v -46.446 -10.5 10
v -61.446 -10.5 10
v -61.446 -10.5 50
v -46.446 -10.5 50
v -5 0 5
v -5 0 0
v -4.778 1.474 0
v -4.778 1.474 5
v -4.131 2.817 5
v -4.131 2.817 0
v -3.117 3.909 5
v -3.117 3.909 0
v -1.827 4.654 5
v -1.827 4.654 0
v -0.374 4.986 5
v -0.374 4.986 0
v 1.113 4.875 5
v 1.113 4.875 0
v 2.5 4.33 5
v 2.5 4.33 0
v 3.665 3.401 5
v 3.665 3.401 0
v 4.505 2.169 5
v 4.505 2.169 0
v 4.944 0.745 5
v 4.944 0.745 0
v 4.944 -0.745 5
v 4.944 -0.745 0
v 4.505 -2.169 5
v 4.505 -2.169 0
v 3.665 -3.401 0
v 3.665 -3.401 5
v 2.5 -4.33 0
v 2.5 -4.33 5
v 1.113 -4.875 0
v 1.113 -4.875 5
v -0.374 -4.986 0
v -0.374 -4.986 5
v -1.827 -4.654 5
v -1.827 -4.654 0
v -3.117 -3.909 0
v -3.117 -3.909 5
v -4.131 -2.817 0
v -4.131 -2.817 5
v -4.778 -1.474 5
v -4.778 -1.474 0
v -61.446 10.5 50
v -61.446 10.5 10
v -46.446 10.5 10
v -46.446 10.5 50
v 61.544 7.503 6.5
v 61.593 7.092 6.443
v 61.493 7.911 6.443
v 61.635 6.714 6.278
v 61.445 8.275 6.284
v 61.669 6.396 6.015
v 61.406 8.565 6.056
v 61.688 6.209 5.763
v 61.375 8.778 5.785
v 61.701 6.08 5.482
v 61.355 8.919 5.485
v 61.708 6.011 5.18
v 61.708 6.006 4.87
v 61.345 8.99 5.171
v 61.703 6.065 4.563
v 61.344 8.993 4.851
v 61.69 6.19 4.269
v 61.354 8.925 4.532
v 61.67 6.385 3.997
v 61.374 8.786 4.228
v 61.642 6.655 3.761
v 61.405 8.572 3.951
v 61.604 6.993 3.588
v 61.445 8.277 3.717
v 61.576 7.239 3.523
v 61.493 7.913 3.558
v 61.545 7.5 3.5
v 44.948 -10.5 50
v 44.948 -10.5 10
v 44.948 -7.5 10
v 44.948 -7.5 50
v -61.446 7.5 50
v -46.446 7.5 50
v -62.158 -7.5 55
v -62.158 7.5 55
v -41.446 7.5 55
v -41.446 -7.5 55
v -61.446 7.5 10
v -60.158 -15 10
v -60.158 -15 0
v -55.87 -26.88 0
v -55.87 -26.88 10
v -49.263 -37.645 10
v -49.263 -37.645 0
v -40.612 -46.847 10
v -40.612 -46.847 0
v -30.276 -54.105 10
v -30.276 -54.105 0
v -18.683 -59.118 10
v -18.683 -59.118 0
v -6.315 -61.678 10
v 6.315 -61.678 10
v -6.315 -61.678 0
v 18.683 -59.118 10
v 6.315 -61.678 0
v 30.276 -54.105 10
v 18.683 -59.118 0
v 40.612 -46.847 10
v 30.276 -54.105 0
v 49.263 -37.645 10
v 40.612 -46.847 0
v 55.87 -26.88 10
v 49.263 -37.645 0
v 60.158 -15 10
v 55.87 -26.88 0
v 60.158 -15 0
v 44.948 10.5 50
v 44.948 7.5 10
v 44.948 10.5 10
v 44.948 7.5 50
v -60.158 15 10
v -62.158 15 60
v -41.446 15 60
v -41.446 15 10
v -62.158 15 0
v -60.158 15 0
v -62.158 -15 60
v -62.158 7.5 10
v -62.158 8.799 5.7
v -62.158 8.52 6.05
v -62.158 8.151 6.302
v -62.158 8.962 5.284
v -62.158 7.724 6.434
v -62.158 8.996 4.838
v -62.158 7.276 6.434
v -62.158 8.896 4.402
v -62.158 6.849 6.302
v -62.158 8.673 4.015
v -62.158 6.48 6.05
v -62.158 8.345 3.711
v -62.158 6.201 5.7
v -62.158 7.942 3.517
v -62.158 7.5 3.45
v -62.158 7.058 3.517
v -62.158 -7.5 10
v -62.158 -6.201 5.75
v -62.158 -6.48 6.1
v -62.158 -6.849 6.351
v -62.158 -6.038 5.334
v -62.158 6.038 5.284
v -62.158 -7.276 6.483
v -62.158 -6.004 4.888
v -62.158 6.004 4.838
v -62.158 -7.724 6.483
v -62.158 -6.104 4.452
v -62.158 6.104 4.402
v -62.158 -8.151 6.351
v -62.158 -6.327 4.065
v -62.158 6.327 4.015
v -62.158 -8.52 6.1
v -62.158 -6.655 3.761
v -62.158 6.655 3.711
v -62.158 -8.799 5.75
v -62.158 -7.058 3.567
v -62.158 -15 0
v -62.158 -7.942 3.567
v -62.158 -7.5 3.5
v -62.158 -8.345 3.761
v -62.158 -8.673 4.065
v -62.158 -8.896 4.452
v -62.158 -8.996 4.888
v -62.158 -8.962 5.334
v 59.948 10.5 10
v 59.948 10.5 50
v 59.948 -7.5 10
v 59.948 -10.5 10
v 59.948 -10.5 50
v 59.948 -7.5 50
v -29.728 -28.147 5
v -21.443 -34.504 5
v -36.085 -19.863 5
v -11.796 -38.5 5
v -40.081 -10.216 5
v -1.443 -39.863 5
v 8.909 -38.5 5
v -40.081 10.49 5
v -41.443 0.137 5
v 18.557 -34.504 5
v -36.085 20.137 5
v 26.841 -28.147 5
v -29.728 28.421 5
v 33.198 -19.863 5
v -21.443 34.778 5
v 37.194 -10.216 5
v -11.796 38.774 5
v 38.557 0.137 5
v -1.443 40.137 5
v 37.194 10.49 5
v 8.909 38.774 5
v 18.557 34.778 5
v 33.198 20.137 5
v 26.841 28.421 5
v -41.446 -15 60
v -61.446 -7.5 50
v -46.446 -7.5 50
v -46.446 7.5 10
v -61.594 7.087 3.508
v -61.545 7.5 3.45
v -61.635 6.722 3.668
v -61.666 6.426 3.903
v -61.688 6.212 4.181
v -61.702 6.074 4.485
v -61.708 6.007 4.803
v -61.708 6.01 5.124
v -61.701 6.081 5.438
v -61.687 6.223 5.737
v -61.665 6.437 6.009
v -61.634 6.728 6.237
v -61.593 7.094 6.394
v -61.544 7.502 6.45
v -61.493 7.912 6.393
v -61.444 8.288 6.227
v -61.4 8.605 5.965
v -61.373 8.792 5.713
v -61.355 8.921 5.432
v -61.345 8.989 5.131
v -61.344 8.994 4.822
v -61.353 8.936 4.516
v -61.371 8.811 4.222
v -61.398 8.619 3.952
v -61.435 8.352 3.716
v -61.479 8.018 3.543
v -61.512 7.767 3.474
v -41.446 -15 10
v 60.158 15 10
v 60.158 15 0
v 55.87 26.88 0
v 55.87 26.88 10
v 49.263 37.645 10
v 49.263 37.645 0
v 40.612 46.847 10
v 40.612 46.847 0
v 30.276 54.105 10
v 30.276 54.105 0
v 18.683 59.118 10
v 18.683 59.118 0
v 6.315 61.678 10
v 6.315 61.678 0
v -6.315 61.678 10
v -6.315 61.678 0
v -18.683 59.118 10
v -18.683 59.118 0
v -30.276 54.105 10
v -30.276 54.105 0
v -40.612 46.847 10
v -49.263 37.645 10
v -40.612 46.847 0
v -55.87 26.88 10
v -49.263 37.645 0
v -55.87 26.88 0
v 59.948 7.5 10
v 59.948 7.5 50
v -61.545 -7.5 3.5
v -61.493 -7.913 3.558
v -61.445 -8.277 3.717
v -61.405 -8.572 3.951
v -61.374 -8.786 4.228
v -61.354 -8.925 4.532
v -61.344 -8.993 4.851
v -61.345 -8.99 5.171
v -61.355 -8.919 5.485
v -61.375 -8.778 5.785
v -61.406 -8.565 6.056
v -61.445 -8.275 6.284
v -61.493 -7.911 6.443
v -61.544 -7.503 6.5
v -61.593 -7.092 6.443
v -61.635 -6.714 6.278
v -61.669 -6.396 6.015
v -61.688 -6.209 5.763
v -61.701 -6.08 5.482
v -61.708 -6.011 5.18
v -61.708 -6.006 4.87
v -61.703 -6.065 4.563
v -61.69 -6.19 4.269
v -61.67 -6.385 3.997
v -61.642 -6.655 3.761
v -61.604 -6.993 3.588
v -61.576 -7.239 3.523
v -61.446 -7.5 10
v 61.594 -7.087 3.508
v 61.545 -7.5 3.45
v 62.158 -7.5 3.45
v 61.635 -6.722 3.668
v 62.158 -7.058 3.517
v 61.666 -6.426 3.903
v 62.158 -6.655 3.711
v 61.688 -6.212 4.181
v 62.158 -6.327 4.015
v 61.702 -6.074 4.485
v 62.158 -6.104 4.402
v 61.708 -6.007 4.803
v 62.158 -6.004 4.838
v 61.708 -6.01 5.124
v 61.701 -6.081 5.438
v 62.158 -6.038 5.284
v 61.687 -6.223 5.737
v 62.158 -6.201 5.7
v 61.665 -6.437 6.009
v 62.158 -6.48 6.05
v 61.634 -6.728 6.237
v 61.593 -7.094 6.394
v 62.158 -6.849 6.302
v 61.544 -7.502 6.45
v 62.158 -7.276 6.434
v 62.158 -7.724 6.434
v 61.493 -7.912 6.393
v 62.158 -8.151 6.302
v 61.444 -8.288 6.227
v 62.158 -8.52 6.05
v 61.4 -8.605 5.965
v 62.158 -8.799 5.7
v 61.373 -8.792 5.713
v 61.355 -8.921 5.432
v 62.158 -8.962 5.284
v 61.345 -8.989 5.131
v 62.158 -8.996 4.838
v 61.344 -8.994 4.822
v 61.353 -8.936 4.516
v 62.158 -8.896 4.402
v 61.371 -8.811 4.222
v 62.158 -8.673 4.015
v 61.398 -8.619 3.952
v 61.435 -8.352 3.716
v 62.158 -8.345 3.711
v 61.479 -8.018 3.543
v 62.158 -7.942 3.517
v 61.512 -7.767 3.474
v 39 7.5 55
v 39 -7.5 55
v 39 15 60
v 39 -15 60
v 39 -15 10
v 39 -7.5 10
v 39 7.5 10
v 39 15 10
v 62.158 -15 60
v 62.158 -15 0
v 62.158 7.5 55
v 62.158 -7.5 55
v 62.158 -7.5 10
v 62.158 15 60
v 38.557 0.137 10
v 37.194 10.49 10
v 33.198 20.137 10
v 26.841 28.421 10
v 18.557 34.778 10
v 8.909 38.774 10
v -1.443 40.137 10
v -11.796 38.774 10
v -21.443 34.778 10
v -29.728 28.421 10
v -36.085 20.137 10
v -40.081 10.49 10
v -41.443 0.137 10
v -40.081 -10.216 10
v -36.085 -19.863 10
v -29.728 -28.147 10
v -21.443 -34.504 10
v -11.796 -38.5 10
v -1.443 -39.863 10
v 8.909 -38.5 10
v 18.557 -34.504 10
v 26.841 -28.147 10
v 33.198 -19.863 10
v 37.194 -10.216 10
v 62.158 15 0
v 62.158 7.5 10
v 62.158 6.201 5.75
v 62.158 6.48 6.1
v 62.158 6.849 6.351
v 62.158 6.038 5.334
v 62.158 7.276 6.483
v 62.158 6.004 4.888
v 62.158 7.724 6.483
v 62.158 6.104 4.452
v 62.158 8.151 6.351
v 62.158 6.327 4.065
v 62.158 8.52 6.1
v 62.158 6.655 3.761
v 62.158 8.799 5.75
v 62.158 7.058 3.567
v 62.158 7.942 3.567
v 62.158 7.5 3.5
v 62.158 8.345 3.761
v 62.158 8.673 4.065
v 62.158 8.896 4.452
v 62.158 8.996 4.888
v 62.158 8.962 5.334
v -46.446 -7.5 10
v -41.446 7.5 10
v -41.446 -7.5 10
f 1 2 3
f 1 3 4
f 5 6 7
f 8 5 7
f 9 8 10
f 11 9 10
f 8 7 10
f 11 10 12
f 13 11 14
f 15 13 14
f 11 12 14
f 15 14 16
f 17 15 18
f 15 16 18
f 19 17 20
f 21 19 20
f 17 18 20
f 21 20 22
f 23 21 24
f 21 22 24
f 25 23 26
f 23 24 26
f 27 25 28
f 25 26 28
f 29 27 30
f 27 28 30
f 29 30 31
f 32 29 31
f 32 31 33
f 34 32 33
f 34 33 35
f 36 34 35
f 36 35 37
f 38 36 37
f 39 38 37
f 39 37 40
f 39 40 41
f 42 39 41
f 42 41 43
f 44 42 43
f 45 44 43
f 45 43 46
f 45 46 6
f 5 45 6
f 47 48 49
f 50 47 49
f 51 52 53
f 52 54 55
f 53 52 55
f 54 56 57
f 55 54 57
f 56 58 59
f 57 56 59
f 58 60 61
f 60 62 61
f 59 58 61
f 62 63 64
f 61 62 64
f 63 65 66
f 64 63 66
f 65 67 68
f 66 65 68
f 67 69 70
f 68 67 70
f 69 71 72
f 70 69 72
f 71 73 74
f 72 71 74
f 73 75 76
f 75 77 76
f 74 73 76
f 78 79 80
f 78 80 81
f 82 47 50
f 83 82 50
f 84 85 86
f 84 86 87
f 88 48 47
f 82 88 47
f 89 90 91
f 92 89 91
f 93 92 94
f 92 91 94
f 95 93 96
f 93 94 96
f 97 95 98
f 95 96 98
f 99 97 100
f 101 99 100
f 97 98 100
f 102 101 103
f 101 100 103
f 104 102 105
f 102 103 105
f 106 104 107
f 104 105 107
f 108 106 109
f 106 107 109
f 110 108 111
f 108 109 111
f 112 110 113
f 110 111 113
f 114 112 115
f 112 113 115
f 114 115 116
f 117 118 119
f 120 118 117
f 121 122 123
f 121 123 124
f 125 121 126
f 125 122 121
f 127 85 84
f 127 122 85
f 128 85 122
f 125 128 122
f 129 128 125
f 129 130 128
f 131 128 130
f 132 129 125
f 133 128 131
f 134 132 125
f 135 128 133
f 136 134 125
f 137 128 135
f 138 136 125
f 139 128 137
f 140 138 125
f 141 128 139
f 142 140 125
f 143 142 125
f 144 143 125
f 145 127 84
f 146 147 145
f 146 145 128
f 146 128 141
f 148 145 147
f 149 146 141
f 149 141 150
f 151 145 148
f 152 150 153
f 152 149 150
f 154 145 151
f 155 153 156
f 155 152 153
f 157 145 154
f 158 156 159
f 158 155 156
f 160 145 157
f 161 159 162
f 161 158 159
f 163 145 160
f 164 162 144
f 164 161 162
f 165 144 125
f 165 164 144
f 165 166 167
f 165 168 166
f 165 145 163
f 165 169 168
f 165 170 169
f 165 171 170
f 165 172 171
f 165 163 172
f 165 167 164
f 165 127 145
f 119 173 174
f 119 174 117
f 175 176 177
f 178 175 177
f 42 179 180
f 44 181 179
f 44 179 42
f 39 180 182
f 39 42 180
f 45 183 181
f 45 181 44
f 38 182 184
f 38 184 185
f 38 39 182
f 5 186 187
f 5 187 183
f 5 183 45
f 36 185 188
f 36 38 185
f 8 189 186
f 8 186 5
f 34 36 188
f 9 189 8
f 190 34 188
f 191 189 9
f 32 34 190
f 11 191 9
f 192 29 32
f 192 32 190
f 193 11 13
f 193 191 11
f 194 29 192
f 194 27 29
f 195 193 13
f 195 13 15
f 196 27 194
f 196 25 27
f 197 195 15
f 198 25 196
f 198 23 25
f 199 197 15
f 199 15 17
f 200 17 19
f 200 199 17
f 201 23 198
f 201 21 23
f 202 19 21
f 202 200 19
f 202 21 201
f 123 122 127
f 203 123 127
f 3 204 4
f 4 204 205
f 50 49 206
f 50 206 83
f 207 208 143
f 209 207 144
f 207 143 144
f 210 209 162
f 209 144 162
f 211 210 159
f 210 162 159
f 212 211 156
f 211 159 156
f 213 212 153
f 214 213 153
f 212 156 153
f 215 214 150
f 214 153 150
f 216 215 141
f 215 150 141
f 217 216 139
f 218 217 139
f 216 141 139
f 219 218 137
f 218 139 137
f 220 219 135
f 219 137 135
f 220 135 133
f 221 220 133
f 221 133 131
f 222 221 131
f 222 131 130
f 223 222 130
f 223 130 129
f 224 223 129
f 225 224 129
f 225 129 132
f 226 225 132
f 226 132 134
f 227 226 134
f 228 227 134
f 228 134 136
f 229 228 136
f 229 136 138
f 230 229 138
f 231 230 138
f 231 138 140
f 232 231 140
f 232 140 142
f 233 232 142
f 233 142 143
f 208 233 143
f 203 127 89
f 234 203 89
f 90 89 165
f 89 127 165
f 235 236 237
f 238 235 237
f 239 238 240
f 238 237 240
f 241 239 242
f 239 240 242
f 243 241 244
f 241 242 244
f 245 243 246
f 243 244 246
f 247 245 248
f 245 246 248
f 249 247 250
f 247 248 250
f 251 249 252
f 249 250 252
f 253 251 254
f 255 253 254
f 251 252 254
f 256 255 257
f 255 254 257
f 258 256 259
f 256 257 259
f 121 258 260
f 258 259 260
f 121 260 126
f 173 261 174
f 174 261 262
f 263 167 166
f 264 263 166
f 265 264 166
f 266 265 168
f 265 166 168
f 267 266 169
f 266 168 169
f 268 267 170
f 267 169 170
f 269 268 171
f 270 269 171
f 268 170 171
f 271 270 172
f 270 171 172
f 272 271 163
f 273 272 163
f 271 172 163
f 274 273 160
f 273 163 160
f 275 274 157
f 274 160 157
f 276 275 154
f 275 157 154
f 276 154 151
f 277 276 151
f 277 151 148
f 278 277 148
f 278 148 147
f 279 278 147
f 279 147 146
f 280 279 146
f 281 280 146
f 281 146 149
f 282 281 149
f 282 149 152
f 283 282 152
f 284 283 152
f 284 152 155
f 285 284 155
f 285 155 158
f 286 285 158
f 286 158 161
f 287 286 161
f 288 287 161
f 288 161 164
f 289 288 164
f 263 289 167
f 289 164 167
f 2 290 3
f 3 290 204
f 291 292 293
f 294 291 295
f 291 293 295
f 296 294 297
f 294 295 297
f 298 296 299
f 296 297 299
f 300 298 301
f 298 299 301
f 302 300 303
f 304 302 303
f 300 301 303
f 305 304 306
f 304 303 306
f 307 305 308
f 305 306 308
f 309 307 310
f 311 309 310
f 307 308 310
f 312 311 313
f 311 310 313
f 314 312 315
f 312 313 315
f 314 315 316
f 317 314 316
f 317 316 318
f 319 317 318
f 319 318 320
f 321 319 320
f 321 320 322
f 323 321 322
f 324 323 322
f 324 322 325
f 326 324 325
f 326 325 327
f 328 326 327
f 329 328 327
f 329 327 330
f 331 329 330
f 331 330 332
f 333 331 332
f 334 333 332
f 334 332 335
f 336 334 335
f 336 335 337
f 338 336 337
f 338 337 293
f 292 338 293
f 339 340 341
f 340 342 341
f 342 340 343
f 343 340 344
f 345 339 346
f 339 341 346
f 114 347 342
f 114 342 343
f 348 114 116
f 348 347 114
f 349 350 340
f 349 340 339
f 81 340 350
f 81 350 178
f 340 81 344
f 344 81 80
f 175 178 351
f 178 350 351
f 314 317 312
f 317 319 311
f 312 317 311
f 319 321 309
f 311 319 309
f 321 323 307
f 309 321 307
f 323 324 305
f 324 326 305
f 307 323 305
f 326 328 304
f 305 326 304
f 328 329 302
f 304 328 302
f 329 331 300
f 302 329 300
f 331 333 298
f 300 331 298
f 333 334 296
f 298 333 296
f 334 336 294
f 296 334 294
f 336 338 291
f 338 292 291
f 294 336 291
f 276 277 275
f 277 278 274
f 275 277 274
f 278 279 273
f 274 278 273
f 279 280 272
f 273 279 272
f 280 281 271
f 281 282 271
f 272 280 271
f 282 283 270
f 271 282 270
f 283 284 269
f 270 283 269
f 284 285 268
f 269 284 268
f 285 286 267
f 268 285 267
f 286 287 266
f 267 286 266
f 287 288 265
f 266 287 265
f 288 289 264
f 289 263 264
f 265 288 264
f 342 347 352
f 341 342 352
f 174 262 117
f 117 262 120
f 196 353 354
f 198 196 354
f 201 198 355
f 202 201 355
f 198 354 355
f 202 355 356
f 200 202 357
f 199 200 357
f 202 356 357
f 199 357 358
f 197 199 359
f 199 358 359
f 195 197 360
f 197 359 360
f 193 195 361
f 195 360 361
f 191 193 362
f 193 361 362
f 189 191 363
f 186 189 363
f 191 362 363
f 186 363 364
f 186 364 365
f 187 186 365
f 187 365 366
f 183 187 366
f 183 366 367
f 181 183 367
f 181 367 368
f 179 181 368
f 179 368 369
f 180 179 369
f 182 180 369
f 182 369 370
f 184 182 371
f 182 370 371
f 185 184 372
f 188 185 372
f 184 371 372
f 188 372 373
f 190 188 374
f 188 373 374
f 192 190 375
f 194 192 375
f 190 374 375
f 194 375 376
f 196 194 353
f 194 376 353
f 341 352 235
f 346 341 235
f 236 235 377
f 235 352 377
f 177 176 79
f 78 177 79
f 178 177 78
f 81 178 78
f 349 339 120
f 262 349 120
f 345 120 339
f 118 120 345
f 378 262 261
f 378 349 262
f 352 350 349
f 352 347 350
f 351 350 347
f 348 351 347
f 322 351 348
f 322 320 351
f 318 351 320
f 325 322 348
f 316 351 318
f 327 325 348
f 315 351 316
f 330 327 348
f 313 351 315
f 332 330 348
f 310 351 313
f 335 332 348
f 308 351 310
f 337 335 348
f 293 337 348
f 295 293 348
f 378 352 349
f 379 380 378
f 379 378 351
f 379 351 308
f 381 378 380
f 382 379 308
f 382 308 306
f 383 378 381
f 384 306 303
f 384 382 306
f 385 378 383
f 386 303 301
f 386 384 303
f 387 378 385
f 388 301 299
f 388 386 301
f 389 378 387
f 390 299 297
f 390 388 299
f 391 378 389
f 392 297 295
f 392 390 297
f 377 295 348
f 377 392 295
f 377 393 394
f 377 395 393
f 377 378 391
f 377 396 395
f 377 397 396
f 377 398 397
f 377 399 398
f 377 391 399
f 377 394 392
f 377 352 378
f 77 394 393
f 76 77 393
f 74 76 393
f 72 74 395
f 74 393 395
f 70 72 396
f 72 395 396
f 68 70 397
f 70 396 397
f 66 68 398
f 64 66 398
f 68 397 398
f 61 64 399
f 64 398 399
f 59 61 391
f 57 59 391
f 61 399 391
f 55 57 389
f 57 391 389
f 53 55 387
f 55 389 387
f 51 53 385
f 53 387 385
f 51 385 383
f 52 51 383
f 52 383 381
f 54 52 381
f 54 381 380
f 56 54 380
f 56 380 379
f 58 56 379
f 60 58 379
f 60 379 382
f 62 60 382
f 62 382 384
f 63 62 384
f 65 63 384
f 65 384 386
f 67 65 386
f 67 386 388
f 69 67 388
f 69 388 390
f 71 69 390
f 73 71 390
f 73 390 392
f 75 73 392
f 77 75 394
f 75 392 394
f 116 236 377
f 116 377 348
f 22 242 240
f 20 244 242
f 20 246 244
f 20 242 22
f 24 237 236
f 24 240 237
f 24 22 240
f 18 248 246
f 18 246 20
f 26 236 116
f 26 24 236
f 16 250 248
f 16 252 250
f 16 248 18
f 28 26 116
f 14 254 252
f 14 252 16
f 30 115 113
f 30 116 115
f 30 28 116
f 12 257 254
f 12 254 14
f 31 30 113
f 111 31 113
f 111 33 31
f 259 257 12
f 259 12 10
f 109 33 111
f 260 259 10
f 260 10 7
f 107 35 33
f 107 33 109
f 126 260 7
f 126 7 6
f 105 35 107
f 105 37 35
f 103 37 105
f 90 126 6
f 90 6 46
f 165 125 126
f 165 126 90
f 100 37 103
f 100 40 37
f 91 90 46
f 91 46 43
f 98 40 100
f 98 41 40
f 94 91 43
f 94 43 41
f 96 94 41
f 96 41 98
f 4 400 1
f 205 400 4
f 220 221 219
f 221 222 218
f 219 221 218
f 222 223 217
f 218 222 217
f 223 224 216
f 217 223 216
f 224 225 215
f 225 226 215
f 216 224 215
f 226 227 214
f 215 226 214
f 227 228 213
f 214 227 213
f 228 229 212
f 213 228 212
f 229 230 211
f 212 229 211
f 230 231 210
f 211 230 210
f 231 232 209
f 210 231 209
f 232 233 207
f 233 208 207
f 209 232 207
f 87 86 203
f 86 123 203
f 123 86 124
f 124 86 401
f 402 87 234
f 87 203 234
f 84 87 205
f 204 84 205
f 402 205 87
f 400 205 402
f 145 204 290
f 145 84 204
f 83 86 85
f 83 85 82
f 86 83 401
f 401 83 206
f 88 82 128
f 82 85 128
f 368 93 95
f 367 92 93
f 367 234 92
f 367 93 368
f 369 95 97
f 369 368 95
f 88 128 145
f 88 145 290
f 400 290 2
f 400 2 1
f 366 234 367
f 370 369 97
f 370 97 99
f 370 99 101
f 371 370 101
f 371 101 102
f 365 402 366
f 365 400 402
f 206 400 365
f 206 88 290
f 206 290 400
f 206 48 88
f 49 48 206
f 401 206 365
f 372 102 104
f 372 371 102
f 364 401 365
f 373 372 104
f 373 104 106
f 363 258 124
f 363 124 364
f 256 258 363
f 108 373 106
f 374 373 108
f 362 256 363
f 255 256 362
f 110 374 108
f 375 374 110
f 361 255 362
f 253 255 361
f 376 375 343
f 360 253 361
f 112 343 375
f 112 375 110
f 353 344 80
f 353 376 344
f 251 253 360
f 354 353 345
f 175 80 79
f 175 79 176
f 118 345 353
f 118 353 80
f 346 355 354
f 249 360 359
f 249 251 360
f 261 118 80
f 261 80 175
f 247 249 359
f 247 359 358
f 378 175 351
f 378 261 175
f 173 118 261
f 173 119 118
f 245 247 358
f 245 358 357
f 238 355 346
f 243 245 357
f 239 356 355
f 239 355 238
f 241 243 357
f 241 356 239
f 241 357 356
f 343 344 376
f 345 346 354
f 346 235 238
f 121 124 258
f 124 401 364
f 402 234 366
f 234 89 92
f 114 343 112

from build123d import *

# Parameters (mm, degrees)
IZIM1_R                     = 62
Y_KSEKLIK_EKSTR_ZYON1_DEPTH = 10
IZIM2_W                     = 60
IZIM2_H                     = 30
IZIM2_R                     = 1.5
IZIM2_W_2                   = 45
IZIM2_H_2                   = 15
Y_KSEKLIK_EKSTR_ZYON2_DEPTH = 25
DAIRESEL_KAPLAMA1_COUNT     = 2
DAIRESEL_KAPLAMA1_ANGLE     = 180
KES_EKSTR_ZYON1_START       = -3
IZIM4_W                     = 15
IZIM4_H                     = 40
KES_EKSTR_ZYON1_DEPTH       = 21
DAIRESEL_KAPLAMA2_COUNT     = 2
IZIM6_W                     = 4.288055231
IZIM6_H                     = 60
IZIM6_W_2                   = 1.841875029
KES_EKSTR_ZYON3_DEPTH       = 20
IZIM5_R                     = 40
KES_EKSTR_ZYON4_DEPTH       = 5
IZIM7_R                     = 5
KES_EKSTR_ZYON5_DEPTH       = 10


with BuildPart() as part:
    # Çizim1 → Yükseklik-Ekstrüzyon1 (new body)
    with BuildSketch(Plane.XY):
        Circle(IZIM1_R)
    extrude(amount=Y_KSEKLIK_EKSTR_ZYON1_DEPTH)

    # Çizim2 → Yükseklik-Ekstrüzyon2 (add)
    with BuildSketch(Plane(origin=(64, 0, 0), x_dir=(0, 0, -1), z_dir=(1, 0, 0))):
        with Locations((-30, 0)):
            Rectangle(IZIM2_W, IZIM2_H)
        with Locations((-5, 7.5)):
            Circle(IZIM2_R, mode=Mode.SUBTRACT)
        with Locations((-4.950442225, -7.5)):
            Circle(IZIM2_R, mode=Mode.SUBTRACT)
        with Locations((-32.5, 0)):
            Rectangle(IZIM2_W_2, IZIM2_H_2, mode=Mode.SUBTRACT)
    y_kseklik_ekstr_zyon2 = extrude(amount=-Y_KSEKLIK_EKSTR_ZYON2_DEPTH)

    # Dairesel Kaplama1: Yükseklik-Ekstrüzyon2 ×2 about axis
    dairesel_kaplama1_axis = Axis((-1.223090101, 0, 0), (0, 0, 1))
    for i in range(1, DAIRESEL_KAPLAMA1_COUNT):
        add(y_kseklik_ekstr_zyon2.rotate(dairesel_kaplama1_axis, i * DAIRESEL_KAPLAMA1_ANGLE / (DAIRESEL_KAPLAMA1_COUNT - 1)))

    # Çizim4 → Kes-Ekstrüzyon1 (cut)
    with BuildSketch(Plane.XZ.offset(-7.5).offset(KES_EKSTR_ZYON1_START)):
        with Locations((-53.946180202, 30)):
            Rectangle(IZIM4_W, IZIM4_H)
    kes_ekstr_zyon1 = extrude(amount=KES_EKSTR_ZYON1_DEPTH, mode=Mode.SUBTRACT)

    # Dairesel Kaplama2: Kes-Ekstrüzyon1 ×2 about axis
    dairesel_kaplama2_axis = Axis((-0.749102638, 0, 0), (0, 0, 1))
    for i in range(1, DAIRESEL_KAPLAMA2_COUNT):
        add(kes_ekstr_zyon1.rotate(dairesel_kaplama2_axis, i * 360 / DAIRESEL_KAPLAMA2_COUNT), mode=Mode.SUBTRACT)

    # Çizim6 → Kes-Ekstrüzyon3 (cut, symmetric)
    with BuildSketch(Plane(origin=(0, 0, 0), x_dir=(1, 0, 0), z_dir=(0, 1, 0))):
        with Locations((-64.302152587, -30)):
            Rectangle(IZIM6_W, IZIM6_H)
        with Locations((63.079062486, -30)):
            Rectangle(IZIM6_W_2, IZIM6_H)
    extrude(amount=KES_EKSTR_ZYON3_DEPTH, both=True, mode=Mode.SUBTRACT)

    # Çizim5 → Kes-Ekstrüzyon4 (cut)
    with BuildSketch(Plane.XY.offset(10)):
        with Locations((-1.443493492, 0.137209833)):
            Circle(IZIM5_R)
    extrude(amount=-KES_EKSTR_ZYON4_DEPTH, mode=Mode.SUBTRACT)

    # Çizim7 → Kes-Ekstrüzyon5 (cut)
    with BuildSketch(Plane(origin=(0, 0, 0), x_dir=(-1, 0, 0), z_dir=(0, 0, -1))):
        Circle(IZIM7_R)
    extrude(amount=-KES_EKSTR_ZYON5_DEPTH, mode=Mode.SUBTRACT)


solid = part.part
